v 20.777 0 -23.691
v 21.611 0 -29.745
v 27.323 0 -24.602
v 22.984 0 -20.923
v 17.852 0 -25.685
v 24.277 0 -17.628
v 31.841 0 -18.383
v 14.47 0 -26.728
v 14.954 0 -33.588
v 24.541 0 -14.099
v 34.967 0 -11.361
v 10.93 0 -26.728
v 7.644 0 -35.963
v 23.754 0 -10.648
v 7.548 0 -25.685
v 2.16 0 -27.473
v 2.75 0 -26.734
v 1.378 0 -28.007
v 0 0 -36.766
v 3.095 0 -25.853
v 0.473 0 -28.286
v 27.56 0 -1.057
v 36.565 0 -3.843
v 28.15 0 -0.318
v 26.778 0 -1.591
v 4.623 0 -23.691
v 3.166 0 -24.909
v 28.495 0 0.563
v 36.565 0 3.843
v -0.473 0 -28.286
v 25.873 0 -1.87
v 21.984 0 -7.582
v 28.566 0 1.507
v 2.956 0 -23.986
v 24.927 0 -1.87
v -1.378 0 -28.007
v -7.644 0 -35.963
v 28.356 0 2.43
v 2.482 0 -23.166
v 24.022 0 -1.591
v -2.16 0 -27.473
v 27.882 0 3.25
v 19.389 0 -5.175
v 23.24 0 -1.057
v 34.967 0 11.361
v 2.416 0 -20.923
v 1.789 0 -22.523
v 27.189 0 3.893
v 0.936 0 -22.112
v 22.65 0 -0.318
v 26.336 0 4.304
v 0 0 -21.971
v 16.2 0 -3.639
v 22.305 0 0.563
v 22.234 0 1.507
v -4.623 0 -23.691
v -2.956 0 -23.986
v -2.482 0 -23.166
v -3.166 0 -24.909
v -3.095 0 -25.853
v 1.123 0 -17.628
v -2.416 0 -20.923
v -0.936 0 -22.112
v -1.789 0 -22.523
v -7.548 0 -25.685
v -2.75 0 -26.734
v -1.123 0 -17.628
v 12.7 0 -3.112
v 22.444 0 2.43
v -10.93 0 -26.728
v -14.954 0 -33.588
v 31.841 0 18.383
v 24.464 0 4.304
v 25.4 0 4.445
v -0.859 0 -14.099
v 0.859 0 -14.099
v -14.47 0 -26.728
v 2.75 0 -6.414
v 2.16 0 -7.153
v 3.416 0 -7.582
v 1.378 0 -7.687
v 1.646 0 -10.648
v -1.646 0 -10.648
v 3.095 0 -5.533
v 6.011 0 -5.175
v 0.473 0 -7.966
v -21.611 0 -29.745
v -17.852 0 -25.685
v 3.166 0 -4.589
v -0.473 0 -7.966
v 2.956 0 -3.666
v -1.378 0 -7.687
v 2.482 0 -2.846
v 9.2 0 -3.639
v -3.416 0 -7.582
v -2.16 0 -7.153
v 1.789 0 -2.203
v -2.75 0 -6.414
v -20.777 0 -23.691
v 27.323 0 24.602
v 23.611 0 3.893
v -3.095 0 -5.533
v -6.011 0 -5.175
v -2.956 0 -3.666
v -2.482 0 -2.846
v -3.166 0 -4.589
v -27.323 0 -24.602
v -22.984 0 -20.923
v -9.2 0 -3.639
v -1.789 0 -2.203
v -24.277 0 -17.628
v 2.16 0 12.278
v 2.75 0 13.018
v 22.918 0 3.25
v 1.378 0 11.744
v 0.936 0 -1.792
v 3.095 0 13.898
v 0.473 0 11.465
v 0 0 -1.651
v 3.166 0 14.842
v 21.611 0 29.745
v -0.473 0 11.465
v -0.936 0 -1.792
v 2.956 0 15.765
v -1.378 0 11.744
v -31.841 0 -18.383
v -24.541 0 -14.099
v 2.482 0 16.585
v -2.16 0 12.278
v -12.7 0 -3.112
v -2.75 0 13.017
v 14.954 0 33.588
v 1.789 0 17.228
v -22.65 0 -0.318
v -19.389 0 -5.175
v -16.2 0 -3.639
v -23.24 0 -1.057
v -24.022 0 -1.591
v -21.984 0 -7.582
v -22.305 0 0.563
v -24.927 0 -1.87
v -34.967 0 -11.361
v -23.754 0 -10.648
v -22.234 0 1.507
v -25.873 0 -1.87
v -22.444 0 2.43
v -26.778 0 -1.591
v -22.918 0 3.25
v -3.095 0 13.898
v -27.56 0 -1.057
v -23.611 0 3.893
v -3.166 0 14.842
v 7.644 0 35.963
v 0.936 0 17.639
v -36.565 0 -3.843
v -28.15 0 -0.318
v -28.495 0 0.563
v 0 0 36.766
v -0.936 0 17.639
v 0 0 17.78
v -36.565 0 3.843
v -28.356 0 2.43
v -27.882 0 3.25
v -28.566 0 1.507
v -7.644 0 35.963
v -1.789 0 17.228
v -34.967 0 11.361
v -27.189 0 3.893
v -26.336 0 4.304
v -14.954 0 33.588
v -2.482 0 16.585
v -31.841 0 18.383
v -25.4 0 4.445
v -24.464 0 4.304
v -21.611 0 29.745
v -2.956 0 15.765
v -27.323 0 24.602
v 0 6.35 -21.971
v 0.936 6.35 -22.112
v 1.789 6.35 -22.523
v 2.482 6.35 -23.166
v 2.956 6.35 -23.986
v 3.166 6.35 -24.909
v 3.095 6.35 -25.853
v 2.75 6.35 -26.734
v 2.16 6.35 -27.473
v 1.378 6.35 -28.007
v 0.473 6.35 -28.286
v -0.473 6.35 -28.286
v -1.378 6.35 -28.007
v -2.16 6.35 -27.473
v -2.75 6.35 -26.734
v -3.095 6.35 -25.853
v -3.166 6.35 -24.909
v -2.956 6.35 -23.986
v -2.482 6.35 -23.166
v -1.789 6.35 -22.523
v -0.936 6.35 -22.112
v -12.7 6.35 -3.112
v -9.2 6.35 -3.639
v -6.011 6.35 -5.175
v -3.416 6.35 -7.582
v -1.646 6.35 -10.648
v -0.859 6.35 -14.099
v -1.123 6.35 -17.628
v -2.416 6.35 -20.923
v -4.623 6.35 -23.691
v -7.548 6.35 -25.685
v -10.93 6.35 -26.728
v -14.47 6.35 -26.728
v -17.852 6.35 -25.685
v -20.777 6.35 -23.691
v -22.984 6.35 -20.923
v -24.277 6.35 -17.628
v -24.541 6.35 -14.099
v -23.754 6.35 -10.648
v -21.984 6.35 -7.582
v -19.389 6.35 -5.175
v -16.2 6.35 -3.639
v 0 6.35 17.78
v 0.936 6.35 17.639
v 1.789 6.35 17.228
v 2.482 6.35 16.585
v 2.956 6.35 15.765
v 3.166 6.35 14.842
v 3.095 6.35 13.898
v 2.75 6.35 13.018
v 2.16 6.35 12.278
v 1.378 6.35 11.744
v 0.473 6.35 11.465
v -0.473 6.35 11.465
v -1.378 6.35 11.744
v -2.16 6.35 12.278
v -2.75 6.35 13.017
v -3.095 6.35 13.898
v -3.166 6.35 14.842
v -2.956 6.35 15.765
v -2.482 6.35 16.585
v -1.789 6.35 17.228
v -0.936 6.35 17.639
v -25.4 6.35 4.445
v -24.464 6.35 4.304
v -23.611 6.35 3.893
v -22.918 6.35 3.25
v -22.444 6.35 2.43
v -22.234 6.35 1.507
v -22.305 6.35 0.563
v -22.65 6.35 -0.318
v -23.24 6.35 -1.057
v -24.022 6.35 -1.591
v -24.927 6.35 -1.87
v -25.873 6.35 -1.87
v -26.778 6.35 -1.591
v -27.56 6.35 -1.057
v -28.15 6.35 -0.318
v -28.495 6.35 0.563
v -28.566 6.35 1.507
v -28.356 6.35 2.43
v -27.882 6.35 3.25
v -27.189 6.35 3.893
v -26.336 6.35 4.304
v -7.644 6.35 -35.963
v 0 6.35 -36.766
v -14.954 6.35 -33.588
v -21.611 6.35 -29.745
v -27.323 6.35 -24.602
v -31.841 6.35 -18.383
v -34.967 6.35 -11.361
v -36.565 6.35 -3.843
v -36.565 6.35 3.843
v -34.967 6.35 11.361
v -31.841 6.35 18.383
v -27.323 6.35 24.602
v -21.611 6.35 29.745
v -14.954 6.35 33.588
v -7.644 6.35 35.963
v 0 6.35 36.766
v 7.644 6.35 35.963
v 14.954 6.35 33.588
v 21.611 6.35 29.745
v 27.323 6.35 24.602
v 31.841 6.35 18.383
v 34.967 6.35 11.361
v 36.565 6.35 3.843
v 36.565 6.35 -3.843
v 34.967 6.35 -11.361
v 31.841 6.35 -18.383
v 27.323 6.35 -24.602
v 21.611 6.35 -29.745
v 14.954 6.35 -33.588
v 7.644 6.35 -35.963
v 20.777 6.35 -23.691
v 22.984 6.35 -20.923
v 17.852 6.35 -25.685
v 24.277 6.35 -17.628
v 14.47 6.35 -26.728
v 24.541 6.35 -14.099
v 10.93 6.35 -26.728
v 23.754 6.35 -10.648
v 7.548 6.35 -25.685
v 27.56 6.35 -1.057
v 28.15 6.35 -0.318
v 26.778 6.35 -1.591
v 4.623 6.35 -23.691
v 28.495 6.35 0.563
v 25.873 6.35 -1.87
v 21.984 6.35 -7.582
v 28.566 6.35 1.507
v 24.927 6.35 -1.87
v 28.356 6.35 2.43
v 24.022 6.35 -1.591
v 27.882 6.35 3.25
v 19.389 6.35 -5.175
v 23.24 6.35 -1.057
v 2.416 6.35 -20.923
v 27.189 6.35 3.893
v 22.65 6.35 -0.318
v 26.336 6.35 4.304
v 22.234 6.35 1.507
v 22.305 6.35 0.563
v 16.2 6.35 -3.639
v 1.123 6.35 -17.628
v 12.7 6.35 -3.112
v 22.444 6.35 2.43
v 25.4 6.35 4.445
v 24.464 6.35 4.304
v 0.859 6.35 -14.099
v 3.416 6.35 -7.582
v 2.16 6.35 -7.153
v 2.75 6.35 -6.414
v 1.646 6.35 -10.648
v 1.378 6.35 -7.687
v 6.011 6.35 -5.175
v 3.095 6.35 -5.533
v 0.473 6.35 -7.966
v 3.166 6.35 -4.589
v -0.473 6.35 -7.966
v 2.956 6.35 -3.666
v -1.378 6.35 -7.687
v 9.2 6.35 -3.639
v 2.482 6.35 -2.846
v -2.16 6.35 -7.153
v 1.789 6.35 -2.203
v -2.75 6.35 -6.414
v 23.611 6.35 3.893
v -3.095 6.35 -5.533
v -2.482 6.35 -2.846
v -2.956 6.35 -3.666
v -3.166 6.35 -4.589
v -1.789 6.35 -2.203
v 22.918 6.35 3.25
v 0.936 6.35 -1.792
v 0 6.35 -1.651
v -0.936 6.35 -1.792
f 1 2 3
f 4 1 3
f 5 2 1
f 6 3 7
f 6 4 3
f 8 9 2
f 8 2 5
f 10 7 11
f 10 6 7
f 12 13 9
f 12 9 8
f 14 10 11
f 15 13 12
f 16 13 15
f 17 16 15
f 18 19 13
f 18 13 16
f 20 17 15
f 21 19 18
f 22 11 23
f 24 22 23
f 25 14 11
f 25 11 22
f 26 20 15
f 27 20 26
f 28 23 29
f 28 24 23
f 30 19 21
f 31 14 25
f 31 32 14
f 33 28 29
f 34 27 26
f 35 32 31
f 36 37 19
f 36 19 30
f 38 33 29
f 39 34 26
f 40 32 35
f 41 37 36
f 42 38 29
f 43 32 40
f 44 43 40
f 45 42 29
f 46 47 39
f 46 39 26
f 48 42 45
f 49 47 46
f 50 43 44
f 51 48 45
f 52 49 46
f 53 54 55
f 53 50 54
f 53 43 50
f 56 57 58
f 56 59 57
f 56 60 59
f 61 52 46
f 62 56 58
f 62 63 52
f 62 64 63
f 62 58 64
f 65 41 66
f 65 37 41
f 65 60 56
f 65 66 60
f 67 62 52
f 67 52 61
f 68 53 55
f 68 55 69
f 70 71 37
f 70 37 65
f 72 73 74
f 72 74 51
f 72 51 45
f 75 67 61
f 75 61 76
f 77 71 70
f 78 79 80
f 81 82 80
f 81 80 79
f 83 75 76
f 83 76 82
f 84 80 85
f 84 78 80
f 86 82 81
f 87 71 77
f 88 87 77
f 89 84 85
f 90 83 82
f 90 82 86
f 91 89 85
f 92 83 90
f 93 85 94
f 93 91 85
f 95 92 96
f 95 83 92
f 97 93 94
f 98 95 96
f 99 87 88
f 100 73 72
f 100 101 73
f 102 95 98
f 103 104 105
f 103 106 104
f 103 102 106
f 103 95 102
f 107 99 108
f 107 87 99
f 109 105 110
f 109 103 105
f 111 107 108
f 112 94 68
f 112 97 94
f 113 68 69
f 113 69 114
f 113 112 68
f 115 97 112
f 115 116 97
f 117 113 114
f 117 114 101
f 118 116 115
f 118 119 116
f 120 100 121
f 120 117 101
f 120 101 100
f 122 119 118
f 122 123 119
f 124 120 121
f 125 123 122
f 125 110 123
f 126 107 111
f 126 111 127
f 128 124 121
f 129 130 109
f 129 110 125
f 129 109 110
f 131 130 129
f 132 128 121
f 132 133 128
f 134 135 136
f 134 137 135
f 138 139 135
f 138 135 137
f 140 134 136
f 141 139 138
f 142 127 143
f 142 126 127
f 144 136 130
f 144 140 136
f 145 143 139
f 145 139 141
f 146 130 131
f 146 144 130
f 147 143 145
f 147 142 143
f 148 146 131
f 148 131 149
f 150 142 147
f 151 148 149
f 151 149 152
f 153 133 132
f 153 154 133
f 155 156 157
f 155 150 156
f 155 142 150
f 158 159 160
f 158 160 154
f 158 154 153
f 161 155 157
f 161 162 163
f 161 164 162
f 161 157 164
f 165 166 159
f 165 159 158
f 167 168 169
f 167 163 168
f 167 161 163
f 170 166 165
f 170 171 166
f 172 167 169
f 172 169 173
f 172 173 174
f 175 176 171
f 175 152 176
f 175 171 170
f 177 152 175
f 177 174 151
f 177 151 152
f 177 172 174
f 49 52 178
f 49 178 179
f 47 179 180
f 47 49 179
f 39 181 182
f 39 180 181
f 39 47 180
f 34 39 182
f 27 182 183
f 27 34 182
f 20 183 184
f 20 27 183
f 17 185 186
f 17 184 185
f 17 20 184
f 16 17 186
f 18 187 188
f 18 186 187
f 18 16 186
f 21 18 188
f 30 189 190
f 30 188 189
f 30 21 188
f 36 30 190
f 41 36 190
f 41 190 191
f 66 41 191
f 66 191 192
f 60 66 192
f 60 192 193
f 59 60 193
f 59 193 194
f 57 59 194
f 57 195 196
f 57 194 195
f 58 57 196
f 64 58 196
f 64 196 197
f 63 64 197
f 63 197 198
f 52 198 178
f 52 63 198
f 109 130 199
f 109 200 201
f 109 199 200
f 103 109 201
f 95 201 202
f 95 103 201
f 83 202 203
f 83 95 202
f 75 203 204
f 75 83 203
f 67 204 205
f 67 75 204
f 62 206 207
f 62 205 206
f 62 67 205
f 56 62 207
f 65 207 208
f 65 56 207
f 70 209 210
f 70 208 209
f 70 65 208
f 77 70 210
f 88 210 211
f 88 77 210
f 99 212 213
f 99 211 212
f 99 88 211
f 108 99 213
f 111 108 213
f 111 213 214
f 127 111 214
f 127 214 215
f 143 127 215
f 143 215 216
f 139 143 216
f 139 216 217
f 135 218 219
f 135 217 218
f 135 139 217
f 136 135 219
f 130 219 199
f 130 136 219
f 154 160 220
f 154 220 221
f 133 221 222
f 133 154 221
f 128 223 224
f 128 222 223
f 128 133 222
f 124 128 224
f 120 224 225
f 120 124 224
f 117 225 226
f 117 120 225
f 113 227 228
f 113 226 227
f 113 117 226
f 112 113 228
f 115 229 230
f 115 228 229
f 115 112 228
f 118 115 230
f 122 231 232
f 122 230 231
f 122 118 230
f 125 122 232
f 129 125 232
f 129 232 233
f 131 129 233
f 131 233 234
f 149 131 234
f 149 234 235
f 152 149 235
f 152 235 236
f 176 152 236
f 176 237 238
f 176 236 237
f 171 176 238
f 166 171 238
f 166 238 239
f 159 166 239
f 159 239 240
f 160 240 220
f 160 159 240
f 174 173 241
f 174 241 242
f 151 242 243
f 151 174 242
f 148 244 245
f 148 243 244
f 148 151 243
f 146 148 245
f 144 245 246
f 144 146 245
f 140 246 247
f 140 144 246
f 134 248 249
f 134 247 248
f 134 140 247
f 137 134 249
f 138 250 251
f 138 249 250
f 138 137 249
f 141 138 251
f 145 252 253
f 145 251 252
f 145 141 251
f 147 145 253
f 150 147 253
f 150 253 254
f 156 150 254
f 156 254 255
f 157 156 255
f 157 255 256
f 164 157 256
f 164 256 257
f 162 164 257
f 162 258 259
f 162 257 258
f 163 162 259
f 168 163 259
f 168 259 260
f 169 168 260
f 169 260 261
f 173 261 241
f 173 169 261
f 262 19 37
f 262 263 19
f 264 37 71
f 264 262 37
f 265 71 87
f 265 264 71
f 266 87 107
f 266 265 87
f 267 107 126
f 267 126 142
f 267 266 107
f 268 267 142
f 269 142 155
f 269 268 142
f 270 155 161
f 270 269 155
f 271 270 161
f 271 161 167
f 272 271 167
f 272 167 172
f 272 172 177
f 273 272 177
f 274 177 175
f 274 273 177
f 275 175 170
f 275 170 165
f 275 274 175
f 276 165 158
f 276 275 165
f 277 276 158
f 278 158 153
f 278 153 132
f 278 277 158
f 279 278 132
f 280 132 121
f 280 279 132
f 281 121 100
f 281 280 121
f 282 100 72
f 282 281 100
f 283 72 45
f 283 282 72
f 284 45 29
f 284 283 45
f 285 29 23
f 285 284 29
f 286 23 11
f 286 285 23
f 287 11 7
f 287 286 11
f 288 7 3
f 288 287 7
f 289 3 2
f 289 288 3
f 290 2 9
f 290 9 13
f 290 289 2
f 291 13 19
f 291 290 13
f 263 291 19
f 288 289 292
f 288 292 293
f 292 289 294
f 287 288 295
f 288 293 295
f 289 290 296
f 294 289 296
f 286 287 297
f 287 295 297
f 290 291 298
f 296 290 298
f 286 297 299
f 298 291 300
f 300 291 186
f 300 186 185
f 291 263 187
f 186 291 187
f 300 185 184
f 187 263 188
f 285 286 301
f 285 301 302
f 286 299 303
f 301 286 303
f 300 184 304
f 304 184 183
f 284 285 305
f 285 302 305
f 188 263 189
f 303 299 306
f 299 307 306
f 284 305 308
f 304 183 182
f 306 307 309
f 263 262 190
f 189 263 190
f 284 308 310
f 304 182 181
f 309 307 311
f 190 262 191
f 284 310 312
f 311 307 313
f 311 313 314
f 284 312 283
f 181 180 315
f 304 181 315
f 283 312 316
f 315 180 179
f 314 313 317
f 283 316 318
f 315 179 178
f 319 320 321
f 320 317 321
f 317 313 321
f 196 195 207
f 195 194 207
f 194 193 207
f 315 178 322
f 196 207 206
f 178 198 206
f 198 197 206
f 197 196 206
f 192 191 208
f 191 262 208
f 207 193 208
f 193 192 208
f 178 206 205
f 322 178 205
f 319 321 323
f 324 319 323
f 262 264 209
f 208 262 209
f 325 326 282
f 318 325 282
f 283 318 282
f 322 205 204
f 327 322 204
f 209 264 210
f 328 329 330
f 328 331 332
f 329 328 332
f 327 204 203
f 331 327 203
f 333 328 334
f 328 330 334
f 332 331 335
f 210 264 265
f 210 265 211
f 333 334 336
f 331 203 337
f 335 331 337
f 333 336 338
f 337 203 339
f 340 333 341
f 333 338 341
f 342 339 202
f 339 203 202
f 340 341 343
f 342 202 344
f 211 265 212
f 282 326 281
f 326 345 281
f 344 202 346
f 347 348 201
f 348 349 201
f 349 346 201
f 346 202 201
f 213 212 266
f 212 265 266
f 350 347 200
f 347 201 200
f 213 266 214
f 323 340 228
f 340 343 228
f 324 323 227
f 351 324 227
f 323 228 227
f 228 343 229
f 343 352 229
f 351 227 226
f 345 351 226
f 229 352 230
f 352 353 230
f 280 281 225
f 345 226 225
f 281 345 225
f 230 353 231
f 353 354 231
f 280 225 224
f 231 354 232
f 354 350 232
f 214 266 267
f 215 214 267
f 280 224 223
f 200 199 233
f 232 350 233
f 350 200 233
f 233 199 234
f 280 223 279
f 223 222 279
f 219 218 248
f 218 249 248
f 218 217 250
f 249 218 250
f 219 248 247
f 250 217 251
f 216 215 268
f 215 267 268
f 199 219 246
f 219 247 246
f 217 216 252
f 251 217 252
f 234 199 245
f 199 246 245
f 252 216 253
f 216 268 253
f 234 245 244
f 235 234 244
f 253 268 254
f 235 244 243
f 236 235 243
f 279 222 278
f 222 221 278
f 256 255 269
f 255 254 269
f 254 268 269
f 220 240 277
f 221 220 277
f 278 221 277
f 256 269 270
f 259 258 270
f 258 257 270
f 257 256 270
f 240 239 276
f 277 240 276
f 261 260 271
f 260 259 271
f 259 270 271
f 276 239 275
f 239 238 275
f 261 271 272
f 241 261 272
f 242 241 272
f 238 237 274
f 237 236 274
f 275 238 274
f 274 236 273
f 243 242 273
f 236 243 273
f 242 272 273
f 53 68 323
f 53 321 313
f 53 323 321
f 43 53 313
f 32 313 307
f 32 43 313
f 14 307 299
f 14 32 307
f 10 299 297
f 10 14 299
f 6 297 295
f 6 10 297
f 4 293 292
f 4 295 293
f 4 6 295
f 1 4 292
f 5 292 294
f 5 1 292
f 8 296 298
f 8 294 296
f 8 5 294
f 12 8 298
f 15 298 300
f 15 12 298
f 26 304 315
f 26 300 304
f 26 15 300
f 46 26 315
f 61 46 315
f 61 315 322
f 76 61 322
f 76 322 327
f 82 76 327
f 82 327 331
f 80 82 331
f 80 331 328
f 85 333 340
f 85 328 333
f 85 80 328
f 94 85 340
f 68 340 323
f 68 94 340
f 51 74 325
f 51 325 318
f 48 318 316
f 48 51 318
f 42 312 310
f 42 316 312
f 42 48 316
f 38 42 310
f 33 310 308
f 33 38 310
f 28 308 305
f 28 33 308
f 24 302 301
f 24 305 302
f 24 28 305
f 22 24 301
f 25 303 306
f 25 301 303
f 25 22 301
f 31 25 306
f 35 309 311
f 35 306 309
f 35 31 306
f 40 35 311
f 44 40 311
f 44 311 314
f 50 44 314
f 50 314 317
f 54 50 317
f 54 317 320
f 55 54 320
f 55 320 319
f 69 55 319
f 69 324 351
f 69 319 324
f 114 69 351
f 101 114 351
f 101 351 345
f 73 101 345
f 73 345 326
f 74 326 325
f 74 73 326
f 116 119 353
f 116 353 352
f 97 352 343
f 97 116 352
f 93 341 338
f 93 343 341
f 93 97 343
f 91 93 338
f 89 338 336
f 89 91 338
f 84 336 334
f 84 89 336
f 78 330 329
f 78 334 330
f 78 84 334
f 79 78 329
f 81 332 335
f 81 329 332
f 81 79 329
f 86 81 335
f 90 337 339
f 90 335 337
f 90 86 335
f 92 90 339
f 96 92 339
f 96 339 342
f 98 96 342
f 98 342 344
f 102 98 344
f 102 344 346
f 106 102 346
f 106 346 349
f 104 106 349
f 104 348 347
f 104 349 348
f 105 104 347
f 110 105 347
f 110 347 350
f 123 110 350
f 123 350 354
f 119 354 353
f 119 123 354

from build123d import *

# Parameters (mm, degrees)
SKETCH1_W               = 36.7665
SKETCH1_H               = 6.35
CUT_EXTRUDE1_DEPTH      = 53.381996378
CUT_EXTRUDE1_DEPTH_BACK = 53.381996378
SKETCH2_R               = 11.8745
SKETCH2_R_2             = 3.175
CUT_EXTRUDE2_DEPTH      = 53.381996378
CUT_EXTRUDE2_DEPTH_BACK = 53.381996378
SKETCH3_R               = 3.175


with BuildPart() as part:
    # Sketch1 → Revolve1 (revolve)
    with BuildSketch(Plane.XY):
        with Locations((18.38325, 3.175)):
            Rectangle(SKETCH1_W, SKETCH1_H)
    revolve(axis=Axis((0, 0, 0), (0, 1, 0)))

    # Sketch2 → Cut-Extrude1 (cut, two sides: drawn at the far end of the back side and taken through both)
    with BuildSketch(Plane(origin=(0, 6.35, 0), x_dir=(1, 0, 0), z_dir=(0, 1, 0)).offset(-CUT_EXTRUDE1_DEPTH_BACK)):
        with Locations((-12.7, 14.986)):
            Circle(SKETCH2_R)
        with Locations((12.7, 14.986)):
            Circle(SKETCH2_R)
        with Locations((0, 25.146)):
            Circle(SKETCH2_R_2)
        with Locations((0, 4.826)):
            Circle(SKETCH2_R_2)
        with Locations((0, -14.605)):
            Circle(SKETCH2_R_2)
    extrude(amount=CUT_EXTRUDE1_DEPTH + CUT_EXTRUDE1_DEPTH_BACK, mode=Mode.SUBTRACT)

    # Sketch3 → Cut-Extrude2 (cut, two sides: drawn at the far end of the back side and taken through both)
    with BuildSketch(Plane(origin=(0, 6.35, 0), x_dir=(1, 0, 0), z_dir=(0, 1, 0)).offset(-CUT_EXTRUDE2_DEPTH_BACK)):
        with Locations((-25.4, -1.27)):
            Circle(SKETCH3_R)
        with Locations((25.4, -1.27)):
            Circle(SKETCH3_R)
    extrude(amount=CUT_EXTRUDE2_DEPTH + CUT_EXTRUDE2_DEPTH_BACK, mode=Mode.SUBTRACT)


solid = part.part
